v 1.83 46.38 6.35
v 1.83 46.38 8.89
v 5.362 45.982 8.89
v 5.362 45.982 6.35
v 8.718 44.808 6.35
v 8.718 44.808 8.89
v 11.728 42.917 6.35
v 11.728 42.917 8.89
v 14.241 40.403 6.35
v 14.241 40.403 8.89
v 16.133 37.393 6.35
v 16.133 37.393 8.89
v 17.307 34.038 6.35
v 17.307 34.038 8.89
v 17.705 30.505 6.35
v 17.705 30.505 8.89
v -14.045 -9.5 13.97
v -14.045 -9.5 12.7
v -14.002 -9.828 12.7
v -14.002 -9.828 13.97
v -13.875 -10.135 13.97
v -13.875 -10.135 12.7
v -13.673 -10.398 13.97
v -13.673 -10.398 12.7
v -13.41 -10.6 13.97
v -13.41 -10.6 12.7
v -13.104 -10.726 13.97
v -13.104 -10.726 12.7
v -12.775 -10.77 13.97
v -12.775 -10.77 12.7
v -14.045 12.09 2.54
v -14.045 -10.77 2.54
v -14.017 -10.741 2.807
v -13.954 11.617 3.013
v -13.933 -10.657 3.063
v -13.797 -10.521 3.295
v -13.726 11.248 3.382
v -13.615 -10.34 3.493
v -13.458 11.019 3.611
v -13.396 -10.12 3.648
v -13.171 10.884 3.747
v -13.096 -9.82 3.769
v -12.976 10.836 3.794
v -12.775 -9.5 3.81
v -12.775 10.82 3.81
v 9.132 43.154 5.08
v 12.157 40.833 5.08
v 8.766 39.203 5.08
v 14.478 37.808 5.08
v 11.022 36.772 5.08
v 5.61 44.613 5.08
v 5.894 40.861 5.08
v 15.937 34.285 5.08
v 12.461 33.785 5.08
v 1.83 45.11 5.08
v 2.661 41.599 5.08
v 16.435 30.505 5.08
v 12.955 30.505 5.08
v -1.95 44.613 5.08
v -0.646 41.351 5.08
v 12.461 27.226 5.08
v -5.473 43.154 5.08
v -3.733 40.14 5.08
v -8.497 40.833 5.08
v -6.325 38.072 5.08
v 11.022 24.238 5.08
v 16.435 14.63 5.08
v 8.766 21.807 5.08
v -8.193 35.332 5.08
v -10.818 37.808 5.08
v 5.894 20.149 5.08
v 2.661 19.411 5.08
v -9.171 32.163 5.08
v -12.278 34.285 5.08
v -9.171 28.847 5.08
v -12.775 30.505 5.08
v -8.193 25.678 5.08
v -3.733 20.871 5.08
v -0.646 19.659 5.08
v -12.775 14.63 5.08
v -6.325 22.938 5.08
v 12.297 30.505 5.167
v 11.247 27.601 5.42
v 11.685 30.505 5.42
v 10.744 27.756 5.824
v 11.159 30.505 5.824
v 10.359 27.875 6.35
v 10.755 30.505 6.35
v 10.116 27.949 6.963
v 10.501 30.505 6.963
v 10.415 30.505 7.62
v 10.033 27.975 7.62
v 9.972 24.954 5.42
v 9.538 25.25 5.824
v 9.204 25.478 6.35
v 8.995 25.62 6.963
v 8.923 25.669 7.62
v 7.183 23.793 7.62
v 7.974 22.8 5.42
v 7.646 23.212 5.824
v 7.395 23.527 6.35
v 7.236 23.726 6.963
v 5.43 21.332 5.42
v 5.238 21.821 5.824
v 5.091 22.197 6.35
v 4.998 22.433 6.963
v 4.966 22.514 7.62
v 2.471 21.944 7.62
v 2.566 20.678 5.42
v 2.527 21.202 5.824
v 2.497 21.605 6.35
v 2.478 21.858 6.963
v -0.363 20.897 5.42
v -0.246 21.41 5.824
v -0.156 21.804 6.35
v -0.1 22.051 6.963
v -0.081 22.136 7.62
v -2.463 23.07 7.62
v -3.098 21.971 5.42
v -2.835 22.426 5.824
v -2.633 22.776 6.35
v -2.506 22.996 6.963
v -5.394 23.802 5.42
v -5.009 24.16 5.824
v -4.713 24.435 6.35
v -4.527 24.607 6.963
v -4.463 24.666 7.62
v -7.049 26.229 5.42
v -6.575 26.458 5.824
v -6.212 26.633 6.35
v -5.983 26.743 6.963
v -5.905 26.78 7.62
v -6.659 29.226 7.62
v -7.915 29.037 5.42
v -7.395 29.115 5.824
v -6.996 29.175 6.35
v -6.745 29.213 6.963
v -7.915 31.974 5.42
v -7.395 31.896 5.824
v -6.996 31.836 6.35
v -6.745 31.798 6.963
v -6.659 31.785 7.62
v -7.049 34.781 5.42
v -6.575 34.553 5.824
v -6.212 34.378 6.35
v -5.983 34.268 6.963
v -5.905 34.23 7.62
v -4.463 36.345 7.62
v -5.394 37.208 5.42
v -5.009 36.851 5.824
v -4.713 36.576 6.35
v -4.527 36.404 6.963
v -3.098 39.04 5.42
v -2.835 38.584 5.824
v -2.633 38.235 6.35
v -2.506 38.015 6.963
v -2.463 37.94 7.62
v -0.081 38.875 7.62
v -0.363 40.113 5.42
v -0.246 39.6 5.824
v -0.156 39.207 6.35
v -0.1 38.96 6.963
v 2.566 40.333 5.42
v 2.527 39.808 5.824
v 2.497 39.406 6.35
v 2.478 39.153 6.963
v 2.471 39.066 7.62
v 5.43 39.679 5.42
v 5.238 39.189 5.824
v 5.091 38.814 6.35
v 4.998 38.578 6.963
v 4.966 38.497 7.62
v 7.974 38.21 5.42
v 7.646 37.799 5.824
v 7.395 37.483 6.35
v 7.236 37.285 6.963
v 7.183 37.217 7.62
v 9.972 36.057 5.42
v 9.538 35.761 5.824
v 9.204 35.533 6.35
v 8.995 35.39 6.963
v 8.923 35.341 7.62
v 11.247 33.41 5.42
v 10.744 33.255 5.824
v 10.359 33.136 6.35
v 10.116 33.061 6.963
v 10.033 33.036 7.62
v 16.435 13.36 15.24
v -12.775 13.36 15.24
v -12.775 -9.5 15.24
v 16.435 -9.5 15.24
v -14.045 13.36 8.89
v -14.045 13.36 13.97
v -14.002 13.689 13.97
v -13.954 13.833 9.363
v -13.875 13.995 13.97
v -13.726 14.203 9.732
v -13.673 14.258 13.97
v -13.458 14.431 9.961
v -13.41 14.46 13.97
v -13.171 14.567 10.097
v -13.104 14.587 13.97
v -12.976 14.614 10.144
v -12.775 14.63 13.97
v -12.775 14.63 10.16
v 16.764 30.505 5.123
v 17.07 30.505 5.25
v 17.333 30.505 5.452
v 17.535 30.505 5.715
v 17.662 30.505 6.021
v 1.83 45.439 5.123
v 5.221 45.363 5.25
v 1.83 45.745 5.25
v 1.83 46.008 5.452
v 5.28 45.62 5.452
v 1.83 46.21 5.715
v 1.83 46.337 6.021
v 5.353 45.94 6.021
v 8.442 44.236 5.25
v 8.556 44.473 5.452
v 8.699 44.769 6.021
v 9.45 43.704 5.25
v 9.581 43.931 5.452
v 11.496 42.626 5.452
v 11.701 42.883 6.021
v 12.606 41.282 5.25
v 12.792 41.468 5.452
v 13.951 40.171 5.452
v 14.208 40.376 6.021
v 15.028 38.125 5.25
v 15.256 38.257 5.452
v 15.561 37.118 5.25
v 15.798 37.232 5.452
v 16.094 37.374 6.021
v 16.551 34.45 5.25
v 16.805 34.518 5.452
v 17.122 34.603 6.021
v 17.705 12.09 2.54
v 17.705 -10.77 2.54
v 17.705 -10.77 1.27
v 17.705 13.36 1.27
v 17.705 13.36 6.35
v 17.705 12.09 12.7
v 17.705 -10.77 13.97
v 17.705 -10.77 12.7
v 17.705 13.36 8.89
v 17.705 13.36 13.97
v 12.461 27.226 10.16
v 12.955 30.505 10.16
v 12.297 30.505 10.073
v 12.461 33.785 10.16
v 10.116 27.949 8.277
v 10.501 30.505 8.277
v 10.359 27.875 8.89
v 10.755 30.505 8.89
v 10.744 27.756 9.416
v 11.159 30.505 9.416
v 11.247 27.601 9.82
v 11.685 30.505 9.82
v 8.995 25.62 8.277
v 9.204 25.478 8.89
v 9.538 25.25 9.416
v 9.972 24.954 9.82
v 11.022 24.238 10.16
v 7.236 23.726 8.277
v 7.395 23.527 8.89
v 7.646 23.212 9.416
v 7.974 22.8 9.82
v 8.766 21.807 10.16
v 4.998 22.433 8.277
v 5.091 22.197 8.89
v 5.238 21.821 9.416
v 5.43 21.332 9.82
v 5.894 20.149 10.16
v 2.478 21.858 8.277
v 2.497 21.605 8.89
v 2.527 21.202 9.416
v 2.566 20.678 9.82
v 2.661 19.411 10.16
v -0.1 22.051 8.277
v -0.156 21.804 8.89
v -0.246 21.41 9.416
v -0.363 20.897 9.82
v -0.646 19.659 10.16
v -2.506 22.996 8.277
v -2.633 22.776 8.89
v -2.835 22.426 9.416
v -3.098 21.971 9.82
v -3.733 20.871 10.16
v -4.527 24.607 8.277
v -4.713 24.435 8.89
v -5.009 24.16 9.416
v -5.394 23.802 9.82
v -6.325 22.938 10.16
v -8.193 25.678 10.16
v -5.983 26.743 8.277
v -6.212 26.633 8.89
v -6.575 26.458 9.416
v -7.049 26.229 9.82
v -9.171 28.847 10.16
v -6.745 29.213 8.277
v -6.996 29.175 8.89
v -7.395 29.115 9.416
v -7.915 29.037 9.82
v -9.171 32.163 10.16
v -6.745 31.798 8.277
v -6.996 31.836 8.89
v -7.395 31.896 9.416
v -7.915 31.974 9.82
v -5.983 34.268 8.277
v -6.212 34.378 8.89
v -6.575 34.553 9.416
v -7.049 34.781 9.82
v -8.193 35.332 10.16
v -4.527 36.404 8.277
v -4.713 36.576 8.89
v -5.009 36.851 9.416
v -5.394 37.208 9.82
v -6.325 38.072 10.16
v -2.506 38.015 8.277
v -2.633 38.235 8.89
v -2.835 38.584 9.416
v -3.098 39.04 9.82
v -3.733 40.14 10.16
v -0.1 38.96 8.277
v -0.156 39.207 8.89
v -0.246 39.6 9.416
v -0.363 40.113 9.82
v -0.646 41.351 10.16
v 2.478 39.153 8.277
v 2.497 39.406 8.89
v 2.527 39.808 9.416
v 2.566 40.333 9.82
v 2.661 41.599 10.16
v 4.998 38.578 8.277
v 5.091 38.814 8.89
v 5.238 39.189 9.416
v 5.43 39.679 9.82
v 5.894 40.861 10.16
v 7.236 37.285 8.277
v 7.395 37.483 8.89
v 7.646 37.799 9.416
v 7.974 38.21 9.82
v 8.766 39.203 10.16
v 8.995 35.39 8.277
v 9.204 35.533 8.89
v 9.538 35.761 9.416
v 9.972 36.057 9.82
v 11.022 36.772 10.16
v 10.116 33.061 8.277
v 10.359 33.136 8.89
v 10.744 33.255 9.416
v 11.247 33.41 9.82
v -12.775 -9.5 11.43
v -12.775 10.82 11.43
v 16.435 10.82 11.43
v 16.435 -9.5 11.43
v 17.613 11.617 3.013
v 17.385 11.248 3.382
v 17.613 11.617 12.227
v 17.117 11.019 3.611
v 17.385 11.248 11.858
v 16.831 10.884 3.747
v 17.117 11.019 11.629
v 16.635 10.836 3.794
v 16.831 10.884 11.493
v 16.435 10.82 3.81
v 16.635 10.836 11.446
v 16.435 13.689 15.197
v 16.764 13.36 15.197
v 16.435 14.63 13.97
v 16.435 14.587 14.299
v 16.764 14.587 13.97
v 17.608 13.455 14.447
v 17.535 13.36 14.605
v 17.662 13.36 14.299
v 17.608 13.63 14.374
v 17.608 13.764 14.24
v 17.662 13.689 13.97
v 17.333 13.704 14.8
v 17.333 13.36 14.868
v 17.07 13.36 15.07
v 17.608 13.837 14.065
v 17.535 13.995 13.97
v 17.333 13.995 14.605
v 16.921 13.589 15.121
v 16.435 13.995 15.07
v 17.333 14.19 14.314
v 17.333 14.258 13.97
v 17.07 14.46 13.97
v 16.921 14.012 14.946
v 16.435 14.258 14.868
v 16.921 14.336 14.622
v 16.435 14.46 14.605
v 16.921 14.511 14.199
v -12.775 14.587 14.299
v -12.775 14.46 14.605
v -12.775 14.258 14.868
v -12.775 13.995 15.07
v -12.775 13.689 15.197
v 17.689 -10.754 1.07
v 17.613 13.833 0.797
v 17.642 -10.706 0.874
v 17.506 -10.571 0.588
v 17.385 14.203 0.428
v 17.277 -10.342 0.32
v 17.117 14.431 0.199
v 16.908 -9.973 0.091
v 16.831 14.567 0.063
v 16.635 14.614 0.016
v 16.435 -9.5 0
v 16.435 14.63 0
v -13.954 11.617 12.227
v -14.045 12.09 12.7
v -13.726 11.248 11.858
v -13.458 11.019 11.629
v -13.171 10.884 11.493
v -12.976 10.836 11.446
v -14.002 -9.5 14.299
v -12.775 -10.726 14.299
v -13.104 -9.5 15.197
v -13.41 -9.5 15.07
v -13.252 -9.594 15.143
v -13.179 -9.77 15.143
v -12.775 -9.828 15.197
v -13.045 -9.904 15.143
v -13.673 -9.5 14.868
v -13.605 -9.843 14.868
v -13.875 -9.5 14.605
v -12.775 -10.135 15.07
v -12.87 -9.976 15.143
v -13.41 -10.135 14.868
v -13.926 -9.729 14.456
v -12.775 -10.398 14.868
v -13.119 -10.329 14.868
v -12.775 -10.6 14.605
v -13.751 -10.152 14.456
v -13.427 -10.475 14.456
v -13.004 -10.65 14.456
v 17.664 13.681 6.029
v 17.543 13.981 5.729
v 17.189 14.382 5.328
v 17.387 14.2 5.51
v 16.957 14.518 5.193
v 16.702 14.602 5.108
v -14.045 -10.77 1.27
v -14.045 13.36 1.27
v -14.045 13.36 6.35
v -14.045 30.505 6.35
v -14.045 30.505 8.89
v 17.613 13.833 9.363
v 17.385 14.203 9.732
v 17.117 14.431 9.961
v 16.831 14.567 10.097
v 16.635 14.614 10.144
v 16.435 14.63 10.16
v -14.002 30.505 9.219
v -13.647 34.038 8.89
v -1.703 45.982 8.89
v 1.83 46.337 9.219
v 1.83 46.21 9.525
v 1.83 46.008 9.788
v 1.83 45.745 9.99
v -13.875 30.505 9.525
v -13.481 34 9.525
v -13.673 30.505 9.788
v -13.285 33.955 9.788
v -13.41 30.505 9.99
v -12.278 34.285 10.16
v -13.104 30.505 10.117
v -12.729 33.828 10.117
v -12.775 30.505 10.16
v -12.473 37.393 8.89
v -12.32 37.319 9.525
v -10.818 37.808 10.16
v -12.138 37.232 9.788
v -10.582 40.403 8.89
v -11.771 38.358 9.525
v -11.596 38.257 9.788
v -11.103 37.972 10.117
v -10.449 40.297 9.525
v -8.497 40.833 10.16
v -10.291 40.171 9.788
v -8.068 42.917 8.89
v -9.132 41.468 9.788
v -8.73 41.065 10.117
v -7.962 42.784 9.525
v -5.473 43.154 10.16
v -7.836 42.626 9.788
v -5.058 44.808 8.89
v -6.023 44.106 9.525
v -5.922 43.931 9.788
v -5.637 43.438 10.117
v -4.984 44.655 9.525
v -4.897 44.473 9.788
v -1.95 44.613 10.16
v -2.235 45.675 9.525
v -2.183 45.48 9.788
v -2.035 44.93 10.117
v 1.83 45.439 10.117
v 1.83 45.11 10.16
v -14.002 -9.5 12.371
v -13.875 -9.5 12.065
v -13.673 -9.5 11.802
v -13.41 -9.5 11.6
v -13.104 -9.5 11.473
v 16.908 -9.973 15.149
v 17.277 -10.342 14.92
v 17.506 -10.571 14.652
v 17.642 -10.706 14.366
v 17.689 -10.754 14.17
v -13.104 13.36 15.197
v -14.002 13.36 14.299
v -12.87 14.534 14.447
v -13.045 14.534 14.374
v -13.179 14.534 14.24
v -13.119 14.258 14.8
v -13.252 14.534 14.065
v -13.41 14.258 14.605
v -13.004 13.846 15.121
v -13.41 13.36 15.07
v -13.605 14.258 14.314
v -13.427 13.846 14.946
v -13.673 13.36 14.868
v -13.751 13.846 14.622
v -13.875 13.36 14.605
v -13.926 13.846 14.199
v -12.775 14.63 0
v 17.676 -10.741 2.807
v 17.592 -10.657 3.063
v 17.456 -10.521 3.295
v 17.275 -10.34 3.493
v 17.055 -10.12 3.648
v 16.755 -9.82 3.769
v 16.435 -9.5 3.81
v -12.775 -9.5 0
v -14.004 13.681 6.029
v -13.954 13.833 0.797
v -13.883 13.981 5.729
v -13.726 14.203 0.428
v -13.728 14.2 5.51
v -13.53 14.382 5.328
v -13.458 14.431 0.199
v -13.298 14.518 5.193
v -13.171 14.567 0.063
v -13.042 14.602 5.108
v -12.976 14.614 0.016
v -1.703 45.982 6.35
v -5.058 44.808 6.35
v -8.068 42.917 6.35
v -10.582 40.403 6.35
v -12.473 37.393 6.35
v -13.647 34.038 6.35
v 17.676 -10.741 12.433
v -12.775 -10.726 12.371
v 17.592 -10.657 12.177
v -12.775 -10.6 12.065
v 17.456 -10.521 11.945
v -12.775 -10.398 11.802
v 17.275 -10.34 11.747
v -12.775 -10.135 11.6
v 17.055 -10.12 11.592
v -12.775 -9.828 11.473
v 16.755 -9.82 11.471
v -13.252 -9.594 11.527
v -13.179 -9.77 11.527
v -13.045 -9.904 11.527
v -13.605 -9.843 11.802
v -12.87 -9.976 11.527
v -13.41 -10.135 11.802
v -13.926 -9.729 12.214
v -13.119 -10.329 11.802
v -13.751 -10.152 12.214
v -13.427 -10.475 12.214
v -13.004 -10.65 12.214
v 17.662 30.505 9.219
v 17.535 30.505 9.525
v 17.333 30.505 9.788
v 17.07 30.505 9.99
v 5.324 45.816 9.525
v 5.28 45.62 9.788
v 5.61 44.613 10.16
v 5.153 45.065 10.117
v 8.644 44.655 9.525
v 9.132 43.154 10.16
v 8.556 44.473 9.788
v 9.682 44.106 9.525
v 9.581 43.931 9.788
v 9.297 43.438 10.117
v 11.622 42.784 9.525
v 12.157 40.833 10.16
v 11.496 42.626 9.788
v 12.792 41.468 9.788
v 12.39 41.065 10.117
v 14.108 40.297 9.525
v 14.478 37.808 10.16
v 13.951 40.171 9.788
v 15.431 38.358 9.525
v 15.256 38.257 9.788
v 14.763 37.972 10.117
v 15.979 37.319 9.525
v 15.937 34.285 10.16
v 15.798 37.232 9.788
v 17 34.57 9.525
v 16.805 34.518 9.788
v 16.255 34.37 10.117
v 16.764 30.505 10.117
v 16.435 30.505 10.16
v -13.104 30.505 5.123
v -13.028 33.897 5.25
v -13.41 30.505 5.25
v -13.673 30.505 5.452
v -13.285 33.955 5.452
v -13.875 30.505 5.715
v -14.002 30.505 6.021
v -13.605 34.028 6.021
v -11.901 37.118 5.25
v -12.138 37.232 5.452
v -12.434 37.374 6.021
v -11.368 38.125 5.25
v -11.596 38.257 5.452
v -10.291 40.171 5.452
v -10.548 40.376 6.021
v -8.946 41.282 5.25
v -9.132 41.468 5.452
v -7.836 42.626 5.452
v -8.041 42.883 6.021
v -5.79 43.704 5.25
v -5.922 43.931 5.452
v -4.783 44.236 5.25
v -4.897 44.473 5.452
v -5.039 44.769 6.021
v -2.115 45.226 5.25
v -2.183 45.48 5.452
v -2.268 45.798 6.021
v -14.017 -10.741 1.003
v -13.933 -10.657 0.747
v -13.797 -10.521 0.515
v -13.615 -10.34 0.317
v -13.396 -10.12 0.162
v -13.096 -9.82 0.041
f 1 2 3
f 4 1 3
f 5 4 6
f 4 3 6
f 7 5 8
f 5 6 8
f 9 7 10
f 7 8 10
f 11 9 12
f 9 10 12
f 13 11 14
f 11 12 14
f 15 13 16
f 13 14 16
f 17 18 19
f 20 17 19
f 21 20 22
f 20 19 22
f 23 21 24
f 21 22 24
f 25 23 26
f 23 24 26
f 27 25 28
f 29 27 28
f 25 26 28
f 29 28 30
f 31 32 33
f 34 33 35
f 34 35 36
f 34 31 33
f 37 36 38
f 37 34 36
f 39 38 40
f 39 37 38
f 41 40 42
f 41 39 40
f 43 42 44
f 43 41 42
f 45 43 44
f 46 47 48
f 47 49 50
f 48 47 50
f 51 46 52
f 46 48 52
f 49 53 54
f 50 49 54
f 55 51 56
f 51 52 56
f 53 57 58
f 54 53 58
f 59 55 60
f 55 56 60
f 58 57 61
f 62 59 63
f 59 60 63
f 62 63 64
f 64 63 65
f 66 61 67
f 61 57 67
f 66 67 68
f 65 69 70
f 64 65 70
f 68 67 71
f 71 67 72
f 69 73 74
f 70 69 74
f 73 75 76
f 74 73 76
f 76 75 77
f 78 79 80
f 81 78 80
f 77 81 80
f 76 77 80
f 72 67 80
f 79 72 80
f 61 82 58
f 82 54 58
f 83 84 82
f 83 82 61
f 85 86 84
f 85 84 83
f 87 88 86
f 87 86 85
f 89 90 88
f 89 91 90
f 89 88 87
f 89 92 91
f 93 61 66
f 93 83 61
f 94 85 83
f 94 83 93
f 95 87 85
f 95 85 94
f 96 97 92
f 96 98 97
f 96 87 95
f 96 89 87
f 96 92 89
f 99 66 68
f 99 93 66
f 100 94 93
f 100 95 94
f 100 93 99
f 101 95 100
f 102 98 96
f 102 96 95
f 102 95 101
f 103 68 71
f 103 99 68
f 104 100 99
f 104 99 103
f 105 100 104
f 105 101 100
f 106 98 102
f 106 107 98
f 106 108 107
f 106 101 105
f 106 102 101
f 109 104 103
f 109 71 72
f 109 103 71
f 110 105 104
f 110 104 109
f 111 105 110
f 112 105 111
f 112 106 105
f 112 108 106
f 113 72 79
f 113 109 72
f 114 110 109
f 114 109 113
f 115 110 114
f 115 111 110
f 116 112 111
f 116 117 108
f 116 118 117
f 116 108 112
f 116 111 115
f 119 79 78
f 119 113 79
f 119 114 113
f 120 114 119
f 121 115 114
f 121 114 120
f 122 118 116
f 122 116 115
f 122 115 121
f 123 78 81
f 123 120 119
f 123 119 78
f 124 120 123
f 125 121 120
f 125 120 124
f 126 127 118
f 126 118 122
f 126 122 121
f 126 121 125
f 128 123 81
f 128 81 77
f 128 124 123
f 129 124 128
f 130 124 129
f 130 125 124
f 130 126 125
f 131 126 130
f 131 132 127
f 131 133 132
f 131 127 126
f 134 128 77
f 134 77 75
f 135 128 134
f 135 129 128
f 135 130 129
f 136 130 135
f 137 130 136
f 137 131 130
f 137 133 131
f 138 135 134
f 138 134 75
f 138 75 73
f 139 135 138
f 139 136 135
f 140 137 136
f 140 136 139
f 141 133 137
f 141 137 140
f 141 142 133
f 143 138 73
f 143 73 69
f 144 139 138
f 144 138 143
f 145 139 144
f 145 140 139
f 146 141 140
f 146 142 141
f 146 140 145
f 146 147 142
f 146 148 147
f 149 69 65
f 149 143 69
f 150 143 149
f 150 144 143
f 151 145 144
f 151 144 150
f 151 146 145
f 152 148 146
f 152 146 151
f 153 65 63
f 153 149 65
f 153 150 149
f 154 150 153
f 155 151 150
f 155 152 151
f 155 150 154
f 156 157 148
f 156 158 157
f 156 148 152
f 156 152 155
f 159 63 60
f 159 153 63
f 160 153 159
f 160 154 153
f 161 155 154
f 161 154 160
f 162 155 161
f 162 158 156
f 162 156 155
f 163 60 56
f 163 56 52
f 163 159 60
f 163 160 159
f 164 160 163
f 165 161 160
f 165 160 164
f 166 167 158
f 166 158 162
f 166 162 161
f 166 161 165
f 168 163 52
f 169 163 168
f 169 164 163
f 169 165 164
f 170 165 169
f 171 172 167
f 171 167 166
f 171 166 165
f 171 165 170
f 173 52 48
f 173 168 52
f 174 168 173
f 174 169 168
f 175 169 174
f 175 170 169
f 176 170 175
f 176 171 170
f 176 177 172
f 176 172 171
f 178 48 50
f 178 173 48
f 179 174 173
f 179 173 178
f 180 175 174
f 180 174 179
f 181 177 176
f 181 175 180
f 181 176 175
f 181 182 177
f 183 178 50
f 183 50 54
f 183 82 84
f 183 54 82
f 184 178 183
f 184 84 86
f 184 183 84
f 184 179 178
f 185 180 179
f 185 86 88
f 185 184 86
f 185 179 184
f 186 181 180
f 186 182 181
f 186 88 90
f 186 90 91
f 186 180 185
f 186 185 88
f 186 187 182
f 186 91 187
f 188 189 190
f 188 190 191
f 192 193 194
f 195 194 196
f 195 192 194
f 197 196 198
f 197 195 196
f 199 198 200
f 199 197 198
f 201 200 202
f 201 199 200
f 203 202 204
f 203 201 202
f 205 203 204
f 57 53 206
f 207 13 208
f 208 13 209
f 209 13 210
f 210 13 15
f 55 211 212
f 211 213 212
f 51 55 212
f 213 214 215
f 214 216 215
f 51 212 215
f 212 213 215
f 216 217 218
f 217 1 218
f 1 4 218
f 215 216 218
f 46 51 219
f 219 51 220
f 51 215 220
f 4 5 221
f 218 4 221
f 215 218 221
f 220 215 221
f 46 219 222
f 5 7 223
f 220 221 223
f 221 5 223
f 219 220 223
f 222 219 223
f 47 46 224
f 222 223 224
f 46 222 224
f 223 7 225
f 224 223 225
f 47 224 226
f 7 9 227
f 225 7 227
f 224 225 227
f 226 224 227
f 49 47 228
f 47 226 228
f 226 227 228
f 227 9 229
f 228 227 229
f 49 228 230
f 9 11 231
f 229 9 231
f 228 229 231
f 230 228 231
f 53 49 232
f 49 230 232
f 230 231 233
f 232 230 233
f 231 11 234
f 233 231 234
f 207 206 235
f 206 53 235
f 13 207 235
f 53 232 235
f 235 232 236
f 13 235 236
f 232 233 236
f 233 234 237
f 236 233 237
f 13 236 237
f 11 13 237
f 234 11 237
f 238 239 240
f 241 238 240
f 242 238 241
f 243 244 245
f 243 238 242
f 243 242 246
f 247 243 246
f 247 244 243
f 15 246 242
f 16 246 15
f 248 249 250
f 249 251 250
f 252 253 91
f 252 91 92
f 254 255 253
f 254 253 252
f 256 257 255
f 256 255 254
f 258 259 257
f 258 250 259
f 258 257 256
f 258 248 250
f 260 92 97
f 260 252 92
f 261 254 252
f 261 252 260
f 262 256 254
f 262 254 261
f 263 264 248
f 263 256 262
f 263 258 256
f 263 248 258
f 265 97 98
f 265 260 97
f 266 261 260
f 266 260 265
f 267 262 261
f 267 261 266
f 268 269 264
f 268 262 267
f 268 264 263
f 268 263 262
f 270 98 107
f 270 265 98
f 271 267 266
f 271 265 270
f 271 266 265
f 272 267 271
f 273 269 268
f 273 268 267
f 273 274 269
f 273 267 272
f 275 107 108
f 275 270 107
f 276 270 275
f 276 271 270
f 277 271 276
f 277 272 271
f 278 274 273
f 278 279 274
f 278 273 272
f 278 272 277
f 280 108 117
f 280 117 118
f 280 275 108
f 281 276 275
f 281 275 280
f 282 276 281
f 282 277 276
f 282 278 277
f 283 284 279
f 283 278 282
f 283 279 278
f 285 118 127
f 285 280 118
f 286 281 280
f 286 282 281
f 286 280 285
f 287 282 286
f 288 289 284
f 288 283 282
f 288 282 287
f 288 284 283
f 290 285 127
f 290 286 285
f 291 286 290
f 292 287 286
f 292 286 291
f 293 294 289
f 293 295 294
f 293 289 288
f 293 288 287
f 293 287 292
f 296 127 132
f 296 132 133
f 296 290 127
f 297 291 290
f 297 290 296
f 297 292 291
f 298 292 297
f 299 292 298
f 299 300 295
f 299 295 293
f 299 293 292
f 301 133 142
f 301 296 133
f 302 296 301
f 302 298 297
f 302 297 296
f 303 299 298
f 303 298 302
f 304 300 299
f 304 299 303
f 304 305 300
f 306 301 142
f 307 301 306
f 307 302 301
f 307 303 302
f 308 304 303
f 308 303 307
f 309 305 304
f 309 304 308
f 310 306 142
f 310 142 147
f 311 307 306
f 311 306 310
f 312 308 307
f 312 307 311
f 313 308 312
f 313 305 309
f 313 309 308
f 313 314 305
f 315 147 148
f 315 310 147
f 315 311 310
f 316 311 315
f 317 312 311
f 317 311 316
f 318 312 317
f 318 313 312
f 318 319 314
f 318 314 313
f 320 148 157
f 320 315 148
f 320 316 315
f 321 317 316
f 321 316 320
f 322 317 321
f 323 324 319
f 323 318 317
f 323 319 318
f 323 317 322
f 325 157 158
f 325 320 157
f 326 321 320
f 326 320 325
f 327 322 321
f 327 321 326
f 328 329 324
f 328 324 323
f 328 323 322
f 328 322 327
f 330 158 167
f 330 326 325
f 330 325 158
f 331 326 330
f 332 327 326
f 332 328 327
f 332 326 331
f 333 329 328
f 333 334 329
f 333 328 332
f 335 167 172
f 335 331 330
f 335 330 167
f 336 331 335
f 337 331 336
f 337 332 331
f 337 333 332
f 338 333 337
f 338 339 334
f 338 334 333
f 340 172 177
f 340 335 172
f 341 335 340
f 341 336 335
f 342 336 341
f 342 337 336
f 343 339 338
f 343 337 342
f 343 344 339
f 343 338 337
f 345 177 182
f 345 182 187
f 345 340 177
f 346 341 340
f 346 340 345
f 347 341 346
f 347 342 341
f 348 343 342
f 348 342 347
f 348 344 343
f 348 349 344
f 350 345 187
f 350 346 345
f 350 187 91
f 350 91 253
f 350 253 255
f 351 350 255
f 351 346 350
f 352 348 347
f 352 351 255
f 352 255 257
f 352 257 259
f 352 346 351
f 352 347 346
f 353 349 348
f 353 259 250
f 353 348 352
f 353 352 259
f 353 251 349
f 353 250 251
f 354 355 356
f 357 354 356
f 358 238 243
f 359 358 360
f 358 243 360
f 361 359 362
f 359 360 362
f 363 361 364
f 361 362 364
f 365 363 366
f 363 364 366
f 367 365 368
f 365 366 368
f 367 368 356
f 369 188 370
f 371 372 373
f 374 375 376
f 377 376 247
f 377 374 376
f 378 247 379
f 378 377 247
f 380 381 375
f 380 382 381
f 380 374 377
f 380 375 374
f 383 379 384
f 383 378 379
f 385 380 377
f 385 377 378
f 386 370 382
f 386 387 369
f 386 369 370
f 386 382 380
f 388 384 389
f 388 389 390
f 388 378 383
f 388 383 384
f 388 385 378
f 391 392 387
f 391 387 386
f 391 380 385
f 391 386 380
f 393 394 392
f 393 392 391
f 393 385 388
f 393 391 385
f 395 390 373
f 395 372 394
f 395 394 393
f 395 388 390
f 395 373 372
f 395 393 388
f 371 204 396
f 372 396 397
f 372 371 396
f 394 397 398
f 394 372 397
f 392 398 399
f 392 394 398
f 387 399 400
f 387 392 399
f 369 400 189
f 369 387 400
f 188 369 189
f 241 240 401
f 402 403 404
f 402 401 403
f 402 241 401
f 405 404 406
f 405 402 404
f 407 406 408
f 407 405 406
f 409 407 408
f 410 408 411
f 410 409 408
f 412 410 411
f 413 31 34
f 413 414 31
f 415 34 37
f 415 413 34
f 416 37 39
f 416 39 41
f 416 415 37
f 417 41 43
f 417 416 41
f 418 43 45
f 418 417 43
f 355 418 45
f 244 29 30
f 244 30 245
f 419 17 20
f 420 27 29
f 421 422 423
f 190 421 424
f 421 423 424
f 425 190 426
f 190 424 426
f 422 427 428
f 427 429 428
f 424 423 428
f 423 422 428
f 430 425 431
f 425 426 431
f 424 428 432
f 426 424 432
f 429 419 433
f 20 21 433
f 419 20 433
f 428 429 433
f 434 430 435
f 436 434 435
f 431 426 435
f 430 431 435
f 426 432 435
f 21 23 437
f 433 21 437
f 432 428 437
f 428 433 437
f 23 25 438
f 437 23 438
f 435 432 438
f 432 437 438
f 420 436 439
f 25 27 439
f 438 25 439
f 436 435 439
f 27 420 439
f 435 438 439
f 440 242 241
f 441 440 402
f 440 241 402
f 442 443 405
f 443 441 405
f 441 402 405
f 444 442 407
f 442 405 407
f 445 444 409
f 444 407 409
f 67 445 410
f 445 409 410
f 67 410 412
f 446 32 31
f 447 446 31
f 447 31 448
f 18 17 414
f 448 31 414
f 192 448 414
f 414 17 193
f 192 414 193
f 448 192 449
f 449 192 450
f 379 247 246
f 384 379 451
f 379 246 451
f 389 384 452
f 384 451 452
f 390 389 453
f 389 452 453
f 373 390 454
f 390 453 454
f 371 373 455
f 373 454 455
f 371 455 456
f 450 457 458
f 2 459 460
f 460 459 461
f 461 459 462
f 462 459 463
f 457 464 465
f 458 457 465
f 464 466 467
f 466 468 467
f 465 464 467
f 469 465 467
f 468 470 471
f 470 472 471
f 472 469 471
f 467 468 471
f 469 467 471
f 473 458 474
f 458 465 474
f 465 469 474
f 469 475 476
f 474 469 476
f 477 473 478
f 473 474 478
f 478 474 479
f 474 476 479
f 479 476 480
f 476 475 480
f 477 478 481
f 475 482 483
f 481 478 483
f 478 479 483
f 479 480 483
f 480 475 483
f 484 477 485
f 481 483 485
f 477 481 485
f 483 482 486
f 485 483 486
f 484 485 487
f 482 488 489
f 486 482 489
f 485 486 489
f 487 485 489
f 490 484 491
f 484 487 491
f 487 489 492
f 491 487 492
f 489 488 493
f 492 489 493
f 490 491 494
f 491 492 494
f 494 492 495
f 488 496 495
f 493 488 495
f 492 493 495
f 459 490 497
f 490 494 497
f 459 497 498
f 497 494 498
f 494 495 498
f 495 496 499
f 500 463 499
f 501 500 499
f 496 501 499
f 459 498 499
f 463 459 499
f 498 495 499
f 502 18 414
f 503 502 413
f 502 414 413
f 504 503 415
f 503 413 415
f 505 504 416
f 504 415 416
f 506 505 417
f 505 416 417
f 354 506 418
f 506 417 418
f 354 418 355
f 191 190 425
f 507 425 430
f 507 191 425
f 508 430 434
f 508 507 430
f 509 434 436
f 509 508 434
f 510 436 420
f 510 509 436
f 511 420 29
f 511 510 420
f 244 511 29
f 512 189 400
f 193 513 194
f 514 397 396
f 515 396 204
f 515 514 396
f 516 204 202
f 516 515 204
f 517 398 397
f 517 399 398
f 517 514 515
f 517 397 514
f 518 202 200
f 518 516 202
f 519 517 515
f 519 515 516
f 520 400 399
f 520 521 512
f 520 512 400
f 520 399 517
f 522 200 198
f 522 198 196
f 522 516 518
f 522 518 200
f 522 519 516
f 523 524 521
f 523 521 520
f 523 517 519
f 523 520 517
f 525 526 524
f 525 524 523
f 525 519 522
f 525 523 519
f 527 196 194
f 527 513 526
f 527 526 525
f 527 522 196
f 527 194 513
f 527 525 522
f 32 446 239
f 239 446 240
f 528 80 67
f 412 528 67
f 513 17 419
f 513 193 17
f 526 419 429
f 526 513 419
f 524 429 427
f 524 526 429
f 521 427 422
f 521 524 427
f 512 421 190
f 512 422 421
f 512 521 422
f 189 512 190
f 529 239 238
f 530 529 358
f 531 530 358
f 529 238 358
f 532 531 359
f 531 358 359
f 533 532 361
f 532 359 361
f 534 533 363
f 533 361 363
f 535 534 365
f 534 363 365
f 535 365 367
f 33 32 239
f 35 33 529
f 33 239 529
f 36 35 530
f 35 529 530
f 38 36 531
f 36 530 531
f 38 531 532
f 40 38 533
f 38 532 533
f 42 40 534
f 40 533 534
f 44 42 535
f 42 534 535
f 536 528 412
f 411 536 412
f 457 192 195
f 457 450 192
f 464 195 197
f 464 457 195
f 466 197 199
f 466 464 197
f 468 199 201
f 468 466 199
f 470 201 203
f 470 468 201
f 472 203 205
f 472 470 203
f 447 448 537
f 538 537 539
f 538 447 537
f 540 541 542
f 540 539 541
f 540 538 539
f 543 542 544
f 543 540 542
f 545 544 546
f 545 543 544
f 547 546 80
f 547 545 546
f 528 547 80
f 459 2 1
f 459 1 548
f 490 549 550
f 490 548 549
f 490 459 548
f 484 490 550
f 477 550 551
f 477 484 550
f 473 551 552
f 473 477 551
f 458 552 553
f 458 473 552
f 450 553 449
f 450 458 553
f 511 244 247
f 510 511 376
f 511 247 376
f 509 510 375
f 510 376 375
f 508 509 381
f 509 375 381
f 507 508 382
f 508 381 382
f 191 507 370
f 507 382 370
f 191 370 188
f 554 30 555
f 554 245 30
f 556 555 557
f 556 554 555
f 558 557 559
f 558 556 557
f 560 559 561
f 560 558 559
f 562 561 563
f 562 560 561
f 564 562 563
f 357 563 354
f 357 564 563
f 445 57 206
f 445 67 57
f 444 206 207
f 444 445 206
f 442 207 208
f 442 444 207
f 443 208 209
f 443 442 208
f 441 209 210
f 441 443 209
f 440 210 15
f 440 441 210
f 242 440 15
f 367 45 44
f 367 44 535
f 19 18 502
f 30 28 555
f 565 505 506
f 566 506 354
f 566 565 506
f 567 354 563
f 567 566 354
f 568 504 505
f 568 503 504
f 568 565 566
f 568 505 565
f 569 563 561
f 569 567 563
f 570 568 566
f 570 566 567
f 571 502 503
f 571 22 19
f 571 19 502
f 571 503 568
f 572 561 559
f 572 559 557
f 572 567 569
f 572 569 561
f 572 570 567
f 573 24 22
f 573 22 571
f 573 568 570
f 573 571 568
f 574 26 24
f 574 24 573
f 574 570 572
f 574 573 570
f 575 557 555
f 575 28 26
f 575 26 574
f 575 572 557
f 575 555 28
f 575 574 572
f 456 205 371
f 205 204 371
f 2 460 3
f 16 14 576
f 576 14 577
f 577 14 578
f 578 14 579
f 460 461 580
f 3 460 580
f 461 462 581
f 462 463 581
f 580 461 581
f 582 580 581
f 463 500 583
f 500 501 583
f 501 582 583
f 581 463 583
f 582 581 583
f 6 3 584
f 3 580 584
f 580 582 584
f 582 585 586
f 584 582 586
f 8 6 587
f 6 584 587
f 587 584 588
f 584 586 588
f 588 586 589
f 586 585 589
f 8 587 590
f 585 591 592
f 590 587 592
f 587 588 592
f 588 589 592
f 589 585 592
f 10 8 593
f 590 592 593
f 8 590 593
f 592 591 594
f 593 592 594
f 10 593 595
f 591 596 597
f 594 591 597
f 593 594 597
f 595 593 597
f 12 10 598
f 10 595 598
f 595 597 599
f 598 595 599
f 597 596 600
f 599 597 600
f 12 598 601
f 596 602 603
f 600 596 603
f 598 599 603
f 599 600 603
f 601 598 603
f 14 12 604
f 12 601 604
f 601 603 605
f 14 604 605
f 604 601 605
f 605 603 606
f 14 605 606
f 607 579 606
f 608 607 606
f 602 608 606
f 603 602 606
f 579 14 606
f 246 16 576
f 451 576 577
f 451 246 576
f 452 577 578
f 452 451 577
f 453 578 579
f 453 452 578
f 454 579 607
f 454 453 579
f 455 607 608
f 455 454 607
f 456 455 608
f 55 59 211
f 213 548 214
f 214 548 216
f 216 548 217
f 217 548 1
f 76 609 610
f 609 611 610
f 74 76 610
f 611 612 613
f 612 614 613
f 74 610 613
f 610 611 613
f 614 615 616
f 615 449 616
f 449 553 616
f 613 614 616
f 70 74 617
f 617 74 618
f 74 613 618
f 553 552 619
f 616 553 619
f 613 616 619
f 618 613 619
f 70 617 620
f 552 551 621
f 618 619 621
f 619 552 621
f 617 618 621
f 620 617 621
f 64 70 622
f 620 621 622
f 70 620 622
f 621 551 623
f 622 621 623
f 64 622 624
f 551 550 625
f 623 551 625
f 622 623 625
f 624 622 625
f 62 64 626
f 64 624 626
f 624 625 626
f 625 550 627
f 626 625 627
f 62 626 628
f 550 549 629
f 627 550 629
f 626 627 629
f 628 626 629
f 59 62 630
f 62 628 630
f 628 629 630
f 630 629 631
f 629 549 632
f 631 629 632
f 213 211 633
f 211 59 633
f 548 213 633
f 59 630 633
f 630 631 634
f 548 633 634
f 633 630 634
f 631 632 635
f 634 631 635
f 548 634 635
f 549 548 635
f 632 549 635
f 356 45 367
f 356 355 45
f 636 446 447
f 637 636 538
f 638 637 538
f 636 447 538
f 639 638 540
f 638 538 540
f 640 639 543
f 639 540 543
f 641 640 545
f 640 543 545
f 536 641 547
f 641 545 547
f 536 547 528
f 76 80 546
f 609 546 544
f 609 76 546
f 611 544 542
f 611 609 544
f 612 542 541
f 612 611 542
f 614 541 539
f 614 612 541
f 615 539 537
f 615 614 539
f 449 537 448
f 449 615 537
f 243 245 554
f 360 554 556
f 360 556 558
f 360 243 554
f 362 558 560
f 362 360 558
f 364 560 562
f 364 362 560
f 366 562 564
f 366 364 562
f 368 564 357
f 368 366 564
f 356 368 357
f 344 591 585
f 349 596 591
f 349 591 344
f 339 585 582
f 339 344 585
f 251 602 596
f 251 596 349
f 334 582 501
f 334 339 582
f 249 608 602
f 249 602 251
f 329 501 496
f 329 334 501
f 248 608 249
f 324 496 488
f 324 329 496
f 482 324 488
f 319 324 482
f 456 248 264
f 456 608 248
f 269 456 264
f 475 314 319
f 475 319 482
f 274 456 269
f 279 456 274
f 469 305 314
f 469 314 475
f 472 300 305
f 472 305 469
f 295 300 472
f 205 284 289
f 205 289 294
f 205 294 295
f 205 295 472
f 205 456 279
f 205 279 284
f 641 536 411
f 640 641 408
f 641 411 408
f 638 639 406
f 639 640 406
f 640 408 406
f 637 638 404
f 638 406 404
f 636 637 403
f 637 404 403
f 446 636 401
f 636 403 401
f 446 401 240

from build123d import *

# Parameters (mm, degrees)
F0_W     = 31.75
F0_H     = 25.4
F1_DEPTH = 3.81
F2_W     = 31.75
F2_H     = 3.81
F3_DEPTH = 3.81
F5_W     = 31.75
F5_H     = 5.08
F6_DEPTH = 31.75
F7_R     = 8.5850562929
F8_DEPTH = 10.161
F9_R     = 15.875
F10_R    = 15.87499
F11_R    = 1.27
F12_R    = 2.53999


# Not quite as in the source:
# - a fillet or chamfer is up to 0.001 mm smaller than in the source, because OpenCascade refuses the exact size


with BuildPart() as f1:
    # F0 (on Top) → F1 (new body)
    with BuildSketch(Plane.XY):
        with Locations((1.8298272586, 1.9303451554)):
            Rectangle(F0_W, F0_H)
    extrude(amount=F1_DEPTH)

    # F2 (on face) → F3 (join)
    with BuildSketch(Plane.XY.offset(3.81)):
        with Locations((1.8298272586, 12.7253451554)):
            Rectangle(F2_W, F2_H)
    extrude(amount=F3_DEPTH)

    # F4: F1 across face


with BuildPart() as f1_1:
    add(f1.part)
    add(f1.part.mirror(Plane(origin=(1.8298272586, 12.7253451554, 7.62), x_dir=(1, 0, 0), z_dir=(0, 0, 1))))

    # F5 (on face) → F6 (join)
    with BuildSketch(Plane(origin=(0, 14.6303451554, 0), x_dir=(-1, 0, 0), z_dir=(0, 1, 0))):
        with Locations((-1.8298272586, 7.62)):
            Rectangle(F5_W, F5_H)
    extrude(amount=F6_DEPTH)

    # F7 (on face) → F8 (cut, through all)
    with BuildSketch(Plane(origin=(0, 0, 5.08), x_dir=(1, 0, 0), z_dir=(0, 0, -1))):
        with Locations((1.8298272586, -30.5053451554)):
            Circle(F7_R)
    extrude(amount=-F8_DEPTH, mode=Mode.SUBTRACT)

    # F9
    f9_edges = [f1_1.edges().sort_by_distance(p)[0] for p in [
        (17.704827, 46.380345, 7.62),
    ]]
    fillet(f9_edges, radius=F9_R)

    # F10 (radius 15.875 in the source; OpenCascade refuses exactly that, so slightly less here)
    f10_edges = [f1_1.edges().sort_by_distance(p)[0] for p in [
        (-14.045173, 46.380345, 7.62),
    ]]
    fillet(f10_edges, radius=F10_R)

    # F11
    f11_edges = [f1_1.edges().sort_by_distance(p)[0] for p in [
        (-14.045173, -10.769655, 13.335),
        (-14.045173, 0.025345, 11.43),
        (-14.045173, 1.930345, 15.24),
        (-14.045173, 0.025345, 3.81),
        (-14.045173, 1.930345, 0),
        (-14.045173, 10.820345, 7.62),
        (-14.045173, 22.56785, 10.16),
        (-14.045173, 22.56785, 5.08),
        (1.829827, 14.630345, 15.24),
        (-14.045173, 14.630345, 12.7),
        (-14.045173, 14.630345, 2.54),
        (1.829827, -10.769655, 3.81),
        (1.829827, -10.769655, 11.43),
        (1.829827, -10.769655, 0),
        (1.829827, -10.769655, 15.24),
        (17.704827, 1.930345, 15.24),
        (17.704827, 0.025345, 11.43),
        (17.704827, 0.025345, 3.81),
        (17.704827, 1.930345, 0),
        (17.704827, 14.630345, 2.54),
        (17.704827, 14.630345, 12.7),
        (17.704827, 10.820345, 7.62),
    ]]
    fillet(f11_edges, radius=F11_R)

    # F12 (radius 2.54 in the source; OpenCascade refuses exactly that, so slightly less here)
    f12_edges = [f1_1.edges().sort_by_distance(p)[0] for p in [
        (-6.755229, 30.505345, 10.16),
        (-6.755229, 30.505345, 5.08),
    ]]
    fillet(f12_edges, radius=F12_R)


solid = f1_1.part
